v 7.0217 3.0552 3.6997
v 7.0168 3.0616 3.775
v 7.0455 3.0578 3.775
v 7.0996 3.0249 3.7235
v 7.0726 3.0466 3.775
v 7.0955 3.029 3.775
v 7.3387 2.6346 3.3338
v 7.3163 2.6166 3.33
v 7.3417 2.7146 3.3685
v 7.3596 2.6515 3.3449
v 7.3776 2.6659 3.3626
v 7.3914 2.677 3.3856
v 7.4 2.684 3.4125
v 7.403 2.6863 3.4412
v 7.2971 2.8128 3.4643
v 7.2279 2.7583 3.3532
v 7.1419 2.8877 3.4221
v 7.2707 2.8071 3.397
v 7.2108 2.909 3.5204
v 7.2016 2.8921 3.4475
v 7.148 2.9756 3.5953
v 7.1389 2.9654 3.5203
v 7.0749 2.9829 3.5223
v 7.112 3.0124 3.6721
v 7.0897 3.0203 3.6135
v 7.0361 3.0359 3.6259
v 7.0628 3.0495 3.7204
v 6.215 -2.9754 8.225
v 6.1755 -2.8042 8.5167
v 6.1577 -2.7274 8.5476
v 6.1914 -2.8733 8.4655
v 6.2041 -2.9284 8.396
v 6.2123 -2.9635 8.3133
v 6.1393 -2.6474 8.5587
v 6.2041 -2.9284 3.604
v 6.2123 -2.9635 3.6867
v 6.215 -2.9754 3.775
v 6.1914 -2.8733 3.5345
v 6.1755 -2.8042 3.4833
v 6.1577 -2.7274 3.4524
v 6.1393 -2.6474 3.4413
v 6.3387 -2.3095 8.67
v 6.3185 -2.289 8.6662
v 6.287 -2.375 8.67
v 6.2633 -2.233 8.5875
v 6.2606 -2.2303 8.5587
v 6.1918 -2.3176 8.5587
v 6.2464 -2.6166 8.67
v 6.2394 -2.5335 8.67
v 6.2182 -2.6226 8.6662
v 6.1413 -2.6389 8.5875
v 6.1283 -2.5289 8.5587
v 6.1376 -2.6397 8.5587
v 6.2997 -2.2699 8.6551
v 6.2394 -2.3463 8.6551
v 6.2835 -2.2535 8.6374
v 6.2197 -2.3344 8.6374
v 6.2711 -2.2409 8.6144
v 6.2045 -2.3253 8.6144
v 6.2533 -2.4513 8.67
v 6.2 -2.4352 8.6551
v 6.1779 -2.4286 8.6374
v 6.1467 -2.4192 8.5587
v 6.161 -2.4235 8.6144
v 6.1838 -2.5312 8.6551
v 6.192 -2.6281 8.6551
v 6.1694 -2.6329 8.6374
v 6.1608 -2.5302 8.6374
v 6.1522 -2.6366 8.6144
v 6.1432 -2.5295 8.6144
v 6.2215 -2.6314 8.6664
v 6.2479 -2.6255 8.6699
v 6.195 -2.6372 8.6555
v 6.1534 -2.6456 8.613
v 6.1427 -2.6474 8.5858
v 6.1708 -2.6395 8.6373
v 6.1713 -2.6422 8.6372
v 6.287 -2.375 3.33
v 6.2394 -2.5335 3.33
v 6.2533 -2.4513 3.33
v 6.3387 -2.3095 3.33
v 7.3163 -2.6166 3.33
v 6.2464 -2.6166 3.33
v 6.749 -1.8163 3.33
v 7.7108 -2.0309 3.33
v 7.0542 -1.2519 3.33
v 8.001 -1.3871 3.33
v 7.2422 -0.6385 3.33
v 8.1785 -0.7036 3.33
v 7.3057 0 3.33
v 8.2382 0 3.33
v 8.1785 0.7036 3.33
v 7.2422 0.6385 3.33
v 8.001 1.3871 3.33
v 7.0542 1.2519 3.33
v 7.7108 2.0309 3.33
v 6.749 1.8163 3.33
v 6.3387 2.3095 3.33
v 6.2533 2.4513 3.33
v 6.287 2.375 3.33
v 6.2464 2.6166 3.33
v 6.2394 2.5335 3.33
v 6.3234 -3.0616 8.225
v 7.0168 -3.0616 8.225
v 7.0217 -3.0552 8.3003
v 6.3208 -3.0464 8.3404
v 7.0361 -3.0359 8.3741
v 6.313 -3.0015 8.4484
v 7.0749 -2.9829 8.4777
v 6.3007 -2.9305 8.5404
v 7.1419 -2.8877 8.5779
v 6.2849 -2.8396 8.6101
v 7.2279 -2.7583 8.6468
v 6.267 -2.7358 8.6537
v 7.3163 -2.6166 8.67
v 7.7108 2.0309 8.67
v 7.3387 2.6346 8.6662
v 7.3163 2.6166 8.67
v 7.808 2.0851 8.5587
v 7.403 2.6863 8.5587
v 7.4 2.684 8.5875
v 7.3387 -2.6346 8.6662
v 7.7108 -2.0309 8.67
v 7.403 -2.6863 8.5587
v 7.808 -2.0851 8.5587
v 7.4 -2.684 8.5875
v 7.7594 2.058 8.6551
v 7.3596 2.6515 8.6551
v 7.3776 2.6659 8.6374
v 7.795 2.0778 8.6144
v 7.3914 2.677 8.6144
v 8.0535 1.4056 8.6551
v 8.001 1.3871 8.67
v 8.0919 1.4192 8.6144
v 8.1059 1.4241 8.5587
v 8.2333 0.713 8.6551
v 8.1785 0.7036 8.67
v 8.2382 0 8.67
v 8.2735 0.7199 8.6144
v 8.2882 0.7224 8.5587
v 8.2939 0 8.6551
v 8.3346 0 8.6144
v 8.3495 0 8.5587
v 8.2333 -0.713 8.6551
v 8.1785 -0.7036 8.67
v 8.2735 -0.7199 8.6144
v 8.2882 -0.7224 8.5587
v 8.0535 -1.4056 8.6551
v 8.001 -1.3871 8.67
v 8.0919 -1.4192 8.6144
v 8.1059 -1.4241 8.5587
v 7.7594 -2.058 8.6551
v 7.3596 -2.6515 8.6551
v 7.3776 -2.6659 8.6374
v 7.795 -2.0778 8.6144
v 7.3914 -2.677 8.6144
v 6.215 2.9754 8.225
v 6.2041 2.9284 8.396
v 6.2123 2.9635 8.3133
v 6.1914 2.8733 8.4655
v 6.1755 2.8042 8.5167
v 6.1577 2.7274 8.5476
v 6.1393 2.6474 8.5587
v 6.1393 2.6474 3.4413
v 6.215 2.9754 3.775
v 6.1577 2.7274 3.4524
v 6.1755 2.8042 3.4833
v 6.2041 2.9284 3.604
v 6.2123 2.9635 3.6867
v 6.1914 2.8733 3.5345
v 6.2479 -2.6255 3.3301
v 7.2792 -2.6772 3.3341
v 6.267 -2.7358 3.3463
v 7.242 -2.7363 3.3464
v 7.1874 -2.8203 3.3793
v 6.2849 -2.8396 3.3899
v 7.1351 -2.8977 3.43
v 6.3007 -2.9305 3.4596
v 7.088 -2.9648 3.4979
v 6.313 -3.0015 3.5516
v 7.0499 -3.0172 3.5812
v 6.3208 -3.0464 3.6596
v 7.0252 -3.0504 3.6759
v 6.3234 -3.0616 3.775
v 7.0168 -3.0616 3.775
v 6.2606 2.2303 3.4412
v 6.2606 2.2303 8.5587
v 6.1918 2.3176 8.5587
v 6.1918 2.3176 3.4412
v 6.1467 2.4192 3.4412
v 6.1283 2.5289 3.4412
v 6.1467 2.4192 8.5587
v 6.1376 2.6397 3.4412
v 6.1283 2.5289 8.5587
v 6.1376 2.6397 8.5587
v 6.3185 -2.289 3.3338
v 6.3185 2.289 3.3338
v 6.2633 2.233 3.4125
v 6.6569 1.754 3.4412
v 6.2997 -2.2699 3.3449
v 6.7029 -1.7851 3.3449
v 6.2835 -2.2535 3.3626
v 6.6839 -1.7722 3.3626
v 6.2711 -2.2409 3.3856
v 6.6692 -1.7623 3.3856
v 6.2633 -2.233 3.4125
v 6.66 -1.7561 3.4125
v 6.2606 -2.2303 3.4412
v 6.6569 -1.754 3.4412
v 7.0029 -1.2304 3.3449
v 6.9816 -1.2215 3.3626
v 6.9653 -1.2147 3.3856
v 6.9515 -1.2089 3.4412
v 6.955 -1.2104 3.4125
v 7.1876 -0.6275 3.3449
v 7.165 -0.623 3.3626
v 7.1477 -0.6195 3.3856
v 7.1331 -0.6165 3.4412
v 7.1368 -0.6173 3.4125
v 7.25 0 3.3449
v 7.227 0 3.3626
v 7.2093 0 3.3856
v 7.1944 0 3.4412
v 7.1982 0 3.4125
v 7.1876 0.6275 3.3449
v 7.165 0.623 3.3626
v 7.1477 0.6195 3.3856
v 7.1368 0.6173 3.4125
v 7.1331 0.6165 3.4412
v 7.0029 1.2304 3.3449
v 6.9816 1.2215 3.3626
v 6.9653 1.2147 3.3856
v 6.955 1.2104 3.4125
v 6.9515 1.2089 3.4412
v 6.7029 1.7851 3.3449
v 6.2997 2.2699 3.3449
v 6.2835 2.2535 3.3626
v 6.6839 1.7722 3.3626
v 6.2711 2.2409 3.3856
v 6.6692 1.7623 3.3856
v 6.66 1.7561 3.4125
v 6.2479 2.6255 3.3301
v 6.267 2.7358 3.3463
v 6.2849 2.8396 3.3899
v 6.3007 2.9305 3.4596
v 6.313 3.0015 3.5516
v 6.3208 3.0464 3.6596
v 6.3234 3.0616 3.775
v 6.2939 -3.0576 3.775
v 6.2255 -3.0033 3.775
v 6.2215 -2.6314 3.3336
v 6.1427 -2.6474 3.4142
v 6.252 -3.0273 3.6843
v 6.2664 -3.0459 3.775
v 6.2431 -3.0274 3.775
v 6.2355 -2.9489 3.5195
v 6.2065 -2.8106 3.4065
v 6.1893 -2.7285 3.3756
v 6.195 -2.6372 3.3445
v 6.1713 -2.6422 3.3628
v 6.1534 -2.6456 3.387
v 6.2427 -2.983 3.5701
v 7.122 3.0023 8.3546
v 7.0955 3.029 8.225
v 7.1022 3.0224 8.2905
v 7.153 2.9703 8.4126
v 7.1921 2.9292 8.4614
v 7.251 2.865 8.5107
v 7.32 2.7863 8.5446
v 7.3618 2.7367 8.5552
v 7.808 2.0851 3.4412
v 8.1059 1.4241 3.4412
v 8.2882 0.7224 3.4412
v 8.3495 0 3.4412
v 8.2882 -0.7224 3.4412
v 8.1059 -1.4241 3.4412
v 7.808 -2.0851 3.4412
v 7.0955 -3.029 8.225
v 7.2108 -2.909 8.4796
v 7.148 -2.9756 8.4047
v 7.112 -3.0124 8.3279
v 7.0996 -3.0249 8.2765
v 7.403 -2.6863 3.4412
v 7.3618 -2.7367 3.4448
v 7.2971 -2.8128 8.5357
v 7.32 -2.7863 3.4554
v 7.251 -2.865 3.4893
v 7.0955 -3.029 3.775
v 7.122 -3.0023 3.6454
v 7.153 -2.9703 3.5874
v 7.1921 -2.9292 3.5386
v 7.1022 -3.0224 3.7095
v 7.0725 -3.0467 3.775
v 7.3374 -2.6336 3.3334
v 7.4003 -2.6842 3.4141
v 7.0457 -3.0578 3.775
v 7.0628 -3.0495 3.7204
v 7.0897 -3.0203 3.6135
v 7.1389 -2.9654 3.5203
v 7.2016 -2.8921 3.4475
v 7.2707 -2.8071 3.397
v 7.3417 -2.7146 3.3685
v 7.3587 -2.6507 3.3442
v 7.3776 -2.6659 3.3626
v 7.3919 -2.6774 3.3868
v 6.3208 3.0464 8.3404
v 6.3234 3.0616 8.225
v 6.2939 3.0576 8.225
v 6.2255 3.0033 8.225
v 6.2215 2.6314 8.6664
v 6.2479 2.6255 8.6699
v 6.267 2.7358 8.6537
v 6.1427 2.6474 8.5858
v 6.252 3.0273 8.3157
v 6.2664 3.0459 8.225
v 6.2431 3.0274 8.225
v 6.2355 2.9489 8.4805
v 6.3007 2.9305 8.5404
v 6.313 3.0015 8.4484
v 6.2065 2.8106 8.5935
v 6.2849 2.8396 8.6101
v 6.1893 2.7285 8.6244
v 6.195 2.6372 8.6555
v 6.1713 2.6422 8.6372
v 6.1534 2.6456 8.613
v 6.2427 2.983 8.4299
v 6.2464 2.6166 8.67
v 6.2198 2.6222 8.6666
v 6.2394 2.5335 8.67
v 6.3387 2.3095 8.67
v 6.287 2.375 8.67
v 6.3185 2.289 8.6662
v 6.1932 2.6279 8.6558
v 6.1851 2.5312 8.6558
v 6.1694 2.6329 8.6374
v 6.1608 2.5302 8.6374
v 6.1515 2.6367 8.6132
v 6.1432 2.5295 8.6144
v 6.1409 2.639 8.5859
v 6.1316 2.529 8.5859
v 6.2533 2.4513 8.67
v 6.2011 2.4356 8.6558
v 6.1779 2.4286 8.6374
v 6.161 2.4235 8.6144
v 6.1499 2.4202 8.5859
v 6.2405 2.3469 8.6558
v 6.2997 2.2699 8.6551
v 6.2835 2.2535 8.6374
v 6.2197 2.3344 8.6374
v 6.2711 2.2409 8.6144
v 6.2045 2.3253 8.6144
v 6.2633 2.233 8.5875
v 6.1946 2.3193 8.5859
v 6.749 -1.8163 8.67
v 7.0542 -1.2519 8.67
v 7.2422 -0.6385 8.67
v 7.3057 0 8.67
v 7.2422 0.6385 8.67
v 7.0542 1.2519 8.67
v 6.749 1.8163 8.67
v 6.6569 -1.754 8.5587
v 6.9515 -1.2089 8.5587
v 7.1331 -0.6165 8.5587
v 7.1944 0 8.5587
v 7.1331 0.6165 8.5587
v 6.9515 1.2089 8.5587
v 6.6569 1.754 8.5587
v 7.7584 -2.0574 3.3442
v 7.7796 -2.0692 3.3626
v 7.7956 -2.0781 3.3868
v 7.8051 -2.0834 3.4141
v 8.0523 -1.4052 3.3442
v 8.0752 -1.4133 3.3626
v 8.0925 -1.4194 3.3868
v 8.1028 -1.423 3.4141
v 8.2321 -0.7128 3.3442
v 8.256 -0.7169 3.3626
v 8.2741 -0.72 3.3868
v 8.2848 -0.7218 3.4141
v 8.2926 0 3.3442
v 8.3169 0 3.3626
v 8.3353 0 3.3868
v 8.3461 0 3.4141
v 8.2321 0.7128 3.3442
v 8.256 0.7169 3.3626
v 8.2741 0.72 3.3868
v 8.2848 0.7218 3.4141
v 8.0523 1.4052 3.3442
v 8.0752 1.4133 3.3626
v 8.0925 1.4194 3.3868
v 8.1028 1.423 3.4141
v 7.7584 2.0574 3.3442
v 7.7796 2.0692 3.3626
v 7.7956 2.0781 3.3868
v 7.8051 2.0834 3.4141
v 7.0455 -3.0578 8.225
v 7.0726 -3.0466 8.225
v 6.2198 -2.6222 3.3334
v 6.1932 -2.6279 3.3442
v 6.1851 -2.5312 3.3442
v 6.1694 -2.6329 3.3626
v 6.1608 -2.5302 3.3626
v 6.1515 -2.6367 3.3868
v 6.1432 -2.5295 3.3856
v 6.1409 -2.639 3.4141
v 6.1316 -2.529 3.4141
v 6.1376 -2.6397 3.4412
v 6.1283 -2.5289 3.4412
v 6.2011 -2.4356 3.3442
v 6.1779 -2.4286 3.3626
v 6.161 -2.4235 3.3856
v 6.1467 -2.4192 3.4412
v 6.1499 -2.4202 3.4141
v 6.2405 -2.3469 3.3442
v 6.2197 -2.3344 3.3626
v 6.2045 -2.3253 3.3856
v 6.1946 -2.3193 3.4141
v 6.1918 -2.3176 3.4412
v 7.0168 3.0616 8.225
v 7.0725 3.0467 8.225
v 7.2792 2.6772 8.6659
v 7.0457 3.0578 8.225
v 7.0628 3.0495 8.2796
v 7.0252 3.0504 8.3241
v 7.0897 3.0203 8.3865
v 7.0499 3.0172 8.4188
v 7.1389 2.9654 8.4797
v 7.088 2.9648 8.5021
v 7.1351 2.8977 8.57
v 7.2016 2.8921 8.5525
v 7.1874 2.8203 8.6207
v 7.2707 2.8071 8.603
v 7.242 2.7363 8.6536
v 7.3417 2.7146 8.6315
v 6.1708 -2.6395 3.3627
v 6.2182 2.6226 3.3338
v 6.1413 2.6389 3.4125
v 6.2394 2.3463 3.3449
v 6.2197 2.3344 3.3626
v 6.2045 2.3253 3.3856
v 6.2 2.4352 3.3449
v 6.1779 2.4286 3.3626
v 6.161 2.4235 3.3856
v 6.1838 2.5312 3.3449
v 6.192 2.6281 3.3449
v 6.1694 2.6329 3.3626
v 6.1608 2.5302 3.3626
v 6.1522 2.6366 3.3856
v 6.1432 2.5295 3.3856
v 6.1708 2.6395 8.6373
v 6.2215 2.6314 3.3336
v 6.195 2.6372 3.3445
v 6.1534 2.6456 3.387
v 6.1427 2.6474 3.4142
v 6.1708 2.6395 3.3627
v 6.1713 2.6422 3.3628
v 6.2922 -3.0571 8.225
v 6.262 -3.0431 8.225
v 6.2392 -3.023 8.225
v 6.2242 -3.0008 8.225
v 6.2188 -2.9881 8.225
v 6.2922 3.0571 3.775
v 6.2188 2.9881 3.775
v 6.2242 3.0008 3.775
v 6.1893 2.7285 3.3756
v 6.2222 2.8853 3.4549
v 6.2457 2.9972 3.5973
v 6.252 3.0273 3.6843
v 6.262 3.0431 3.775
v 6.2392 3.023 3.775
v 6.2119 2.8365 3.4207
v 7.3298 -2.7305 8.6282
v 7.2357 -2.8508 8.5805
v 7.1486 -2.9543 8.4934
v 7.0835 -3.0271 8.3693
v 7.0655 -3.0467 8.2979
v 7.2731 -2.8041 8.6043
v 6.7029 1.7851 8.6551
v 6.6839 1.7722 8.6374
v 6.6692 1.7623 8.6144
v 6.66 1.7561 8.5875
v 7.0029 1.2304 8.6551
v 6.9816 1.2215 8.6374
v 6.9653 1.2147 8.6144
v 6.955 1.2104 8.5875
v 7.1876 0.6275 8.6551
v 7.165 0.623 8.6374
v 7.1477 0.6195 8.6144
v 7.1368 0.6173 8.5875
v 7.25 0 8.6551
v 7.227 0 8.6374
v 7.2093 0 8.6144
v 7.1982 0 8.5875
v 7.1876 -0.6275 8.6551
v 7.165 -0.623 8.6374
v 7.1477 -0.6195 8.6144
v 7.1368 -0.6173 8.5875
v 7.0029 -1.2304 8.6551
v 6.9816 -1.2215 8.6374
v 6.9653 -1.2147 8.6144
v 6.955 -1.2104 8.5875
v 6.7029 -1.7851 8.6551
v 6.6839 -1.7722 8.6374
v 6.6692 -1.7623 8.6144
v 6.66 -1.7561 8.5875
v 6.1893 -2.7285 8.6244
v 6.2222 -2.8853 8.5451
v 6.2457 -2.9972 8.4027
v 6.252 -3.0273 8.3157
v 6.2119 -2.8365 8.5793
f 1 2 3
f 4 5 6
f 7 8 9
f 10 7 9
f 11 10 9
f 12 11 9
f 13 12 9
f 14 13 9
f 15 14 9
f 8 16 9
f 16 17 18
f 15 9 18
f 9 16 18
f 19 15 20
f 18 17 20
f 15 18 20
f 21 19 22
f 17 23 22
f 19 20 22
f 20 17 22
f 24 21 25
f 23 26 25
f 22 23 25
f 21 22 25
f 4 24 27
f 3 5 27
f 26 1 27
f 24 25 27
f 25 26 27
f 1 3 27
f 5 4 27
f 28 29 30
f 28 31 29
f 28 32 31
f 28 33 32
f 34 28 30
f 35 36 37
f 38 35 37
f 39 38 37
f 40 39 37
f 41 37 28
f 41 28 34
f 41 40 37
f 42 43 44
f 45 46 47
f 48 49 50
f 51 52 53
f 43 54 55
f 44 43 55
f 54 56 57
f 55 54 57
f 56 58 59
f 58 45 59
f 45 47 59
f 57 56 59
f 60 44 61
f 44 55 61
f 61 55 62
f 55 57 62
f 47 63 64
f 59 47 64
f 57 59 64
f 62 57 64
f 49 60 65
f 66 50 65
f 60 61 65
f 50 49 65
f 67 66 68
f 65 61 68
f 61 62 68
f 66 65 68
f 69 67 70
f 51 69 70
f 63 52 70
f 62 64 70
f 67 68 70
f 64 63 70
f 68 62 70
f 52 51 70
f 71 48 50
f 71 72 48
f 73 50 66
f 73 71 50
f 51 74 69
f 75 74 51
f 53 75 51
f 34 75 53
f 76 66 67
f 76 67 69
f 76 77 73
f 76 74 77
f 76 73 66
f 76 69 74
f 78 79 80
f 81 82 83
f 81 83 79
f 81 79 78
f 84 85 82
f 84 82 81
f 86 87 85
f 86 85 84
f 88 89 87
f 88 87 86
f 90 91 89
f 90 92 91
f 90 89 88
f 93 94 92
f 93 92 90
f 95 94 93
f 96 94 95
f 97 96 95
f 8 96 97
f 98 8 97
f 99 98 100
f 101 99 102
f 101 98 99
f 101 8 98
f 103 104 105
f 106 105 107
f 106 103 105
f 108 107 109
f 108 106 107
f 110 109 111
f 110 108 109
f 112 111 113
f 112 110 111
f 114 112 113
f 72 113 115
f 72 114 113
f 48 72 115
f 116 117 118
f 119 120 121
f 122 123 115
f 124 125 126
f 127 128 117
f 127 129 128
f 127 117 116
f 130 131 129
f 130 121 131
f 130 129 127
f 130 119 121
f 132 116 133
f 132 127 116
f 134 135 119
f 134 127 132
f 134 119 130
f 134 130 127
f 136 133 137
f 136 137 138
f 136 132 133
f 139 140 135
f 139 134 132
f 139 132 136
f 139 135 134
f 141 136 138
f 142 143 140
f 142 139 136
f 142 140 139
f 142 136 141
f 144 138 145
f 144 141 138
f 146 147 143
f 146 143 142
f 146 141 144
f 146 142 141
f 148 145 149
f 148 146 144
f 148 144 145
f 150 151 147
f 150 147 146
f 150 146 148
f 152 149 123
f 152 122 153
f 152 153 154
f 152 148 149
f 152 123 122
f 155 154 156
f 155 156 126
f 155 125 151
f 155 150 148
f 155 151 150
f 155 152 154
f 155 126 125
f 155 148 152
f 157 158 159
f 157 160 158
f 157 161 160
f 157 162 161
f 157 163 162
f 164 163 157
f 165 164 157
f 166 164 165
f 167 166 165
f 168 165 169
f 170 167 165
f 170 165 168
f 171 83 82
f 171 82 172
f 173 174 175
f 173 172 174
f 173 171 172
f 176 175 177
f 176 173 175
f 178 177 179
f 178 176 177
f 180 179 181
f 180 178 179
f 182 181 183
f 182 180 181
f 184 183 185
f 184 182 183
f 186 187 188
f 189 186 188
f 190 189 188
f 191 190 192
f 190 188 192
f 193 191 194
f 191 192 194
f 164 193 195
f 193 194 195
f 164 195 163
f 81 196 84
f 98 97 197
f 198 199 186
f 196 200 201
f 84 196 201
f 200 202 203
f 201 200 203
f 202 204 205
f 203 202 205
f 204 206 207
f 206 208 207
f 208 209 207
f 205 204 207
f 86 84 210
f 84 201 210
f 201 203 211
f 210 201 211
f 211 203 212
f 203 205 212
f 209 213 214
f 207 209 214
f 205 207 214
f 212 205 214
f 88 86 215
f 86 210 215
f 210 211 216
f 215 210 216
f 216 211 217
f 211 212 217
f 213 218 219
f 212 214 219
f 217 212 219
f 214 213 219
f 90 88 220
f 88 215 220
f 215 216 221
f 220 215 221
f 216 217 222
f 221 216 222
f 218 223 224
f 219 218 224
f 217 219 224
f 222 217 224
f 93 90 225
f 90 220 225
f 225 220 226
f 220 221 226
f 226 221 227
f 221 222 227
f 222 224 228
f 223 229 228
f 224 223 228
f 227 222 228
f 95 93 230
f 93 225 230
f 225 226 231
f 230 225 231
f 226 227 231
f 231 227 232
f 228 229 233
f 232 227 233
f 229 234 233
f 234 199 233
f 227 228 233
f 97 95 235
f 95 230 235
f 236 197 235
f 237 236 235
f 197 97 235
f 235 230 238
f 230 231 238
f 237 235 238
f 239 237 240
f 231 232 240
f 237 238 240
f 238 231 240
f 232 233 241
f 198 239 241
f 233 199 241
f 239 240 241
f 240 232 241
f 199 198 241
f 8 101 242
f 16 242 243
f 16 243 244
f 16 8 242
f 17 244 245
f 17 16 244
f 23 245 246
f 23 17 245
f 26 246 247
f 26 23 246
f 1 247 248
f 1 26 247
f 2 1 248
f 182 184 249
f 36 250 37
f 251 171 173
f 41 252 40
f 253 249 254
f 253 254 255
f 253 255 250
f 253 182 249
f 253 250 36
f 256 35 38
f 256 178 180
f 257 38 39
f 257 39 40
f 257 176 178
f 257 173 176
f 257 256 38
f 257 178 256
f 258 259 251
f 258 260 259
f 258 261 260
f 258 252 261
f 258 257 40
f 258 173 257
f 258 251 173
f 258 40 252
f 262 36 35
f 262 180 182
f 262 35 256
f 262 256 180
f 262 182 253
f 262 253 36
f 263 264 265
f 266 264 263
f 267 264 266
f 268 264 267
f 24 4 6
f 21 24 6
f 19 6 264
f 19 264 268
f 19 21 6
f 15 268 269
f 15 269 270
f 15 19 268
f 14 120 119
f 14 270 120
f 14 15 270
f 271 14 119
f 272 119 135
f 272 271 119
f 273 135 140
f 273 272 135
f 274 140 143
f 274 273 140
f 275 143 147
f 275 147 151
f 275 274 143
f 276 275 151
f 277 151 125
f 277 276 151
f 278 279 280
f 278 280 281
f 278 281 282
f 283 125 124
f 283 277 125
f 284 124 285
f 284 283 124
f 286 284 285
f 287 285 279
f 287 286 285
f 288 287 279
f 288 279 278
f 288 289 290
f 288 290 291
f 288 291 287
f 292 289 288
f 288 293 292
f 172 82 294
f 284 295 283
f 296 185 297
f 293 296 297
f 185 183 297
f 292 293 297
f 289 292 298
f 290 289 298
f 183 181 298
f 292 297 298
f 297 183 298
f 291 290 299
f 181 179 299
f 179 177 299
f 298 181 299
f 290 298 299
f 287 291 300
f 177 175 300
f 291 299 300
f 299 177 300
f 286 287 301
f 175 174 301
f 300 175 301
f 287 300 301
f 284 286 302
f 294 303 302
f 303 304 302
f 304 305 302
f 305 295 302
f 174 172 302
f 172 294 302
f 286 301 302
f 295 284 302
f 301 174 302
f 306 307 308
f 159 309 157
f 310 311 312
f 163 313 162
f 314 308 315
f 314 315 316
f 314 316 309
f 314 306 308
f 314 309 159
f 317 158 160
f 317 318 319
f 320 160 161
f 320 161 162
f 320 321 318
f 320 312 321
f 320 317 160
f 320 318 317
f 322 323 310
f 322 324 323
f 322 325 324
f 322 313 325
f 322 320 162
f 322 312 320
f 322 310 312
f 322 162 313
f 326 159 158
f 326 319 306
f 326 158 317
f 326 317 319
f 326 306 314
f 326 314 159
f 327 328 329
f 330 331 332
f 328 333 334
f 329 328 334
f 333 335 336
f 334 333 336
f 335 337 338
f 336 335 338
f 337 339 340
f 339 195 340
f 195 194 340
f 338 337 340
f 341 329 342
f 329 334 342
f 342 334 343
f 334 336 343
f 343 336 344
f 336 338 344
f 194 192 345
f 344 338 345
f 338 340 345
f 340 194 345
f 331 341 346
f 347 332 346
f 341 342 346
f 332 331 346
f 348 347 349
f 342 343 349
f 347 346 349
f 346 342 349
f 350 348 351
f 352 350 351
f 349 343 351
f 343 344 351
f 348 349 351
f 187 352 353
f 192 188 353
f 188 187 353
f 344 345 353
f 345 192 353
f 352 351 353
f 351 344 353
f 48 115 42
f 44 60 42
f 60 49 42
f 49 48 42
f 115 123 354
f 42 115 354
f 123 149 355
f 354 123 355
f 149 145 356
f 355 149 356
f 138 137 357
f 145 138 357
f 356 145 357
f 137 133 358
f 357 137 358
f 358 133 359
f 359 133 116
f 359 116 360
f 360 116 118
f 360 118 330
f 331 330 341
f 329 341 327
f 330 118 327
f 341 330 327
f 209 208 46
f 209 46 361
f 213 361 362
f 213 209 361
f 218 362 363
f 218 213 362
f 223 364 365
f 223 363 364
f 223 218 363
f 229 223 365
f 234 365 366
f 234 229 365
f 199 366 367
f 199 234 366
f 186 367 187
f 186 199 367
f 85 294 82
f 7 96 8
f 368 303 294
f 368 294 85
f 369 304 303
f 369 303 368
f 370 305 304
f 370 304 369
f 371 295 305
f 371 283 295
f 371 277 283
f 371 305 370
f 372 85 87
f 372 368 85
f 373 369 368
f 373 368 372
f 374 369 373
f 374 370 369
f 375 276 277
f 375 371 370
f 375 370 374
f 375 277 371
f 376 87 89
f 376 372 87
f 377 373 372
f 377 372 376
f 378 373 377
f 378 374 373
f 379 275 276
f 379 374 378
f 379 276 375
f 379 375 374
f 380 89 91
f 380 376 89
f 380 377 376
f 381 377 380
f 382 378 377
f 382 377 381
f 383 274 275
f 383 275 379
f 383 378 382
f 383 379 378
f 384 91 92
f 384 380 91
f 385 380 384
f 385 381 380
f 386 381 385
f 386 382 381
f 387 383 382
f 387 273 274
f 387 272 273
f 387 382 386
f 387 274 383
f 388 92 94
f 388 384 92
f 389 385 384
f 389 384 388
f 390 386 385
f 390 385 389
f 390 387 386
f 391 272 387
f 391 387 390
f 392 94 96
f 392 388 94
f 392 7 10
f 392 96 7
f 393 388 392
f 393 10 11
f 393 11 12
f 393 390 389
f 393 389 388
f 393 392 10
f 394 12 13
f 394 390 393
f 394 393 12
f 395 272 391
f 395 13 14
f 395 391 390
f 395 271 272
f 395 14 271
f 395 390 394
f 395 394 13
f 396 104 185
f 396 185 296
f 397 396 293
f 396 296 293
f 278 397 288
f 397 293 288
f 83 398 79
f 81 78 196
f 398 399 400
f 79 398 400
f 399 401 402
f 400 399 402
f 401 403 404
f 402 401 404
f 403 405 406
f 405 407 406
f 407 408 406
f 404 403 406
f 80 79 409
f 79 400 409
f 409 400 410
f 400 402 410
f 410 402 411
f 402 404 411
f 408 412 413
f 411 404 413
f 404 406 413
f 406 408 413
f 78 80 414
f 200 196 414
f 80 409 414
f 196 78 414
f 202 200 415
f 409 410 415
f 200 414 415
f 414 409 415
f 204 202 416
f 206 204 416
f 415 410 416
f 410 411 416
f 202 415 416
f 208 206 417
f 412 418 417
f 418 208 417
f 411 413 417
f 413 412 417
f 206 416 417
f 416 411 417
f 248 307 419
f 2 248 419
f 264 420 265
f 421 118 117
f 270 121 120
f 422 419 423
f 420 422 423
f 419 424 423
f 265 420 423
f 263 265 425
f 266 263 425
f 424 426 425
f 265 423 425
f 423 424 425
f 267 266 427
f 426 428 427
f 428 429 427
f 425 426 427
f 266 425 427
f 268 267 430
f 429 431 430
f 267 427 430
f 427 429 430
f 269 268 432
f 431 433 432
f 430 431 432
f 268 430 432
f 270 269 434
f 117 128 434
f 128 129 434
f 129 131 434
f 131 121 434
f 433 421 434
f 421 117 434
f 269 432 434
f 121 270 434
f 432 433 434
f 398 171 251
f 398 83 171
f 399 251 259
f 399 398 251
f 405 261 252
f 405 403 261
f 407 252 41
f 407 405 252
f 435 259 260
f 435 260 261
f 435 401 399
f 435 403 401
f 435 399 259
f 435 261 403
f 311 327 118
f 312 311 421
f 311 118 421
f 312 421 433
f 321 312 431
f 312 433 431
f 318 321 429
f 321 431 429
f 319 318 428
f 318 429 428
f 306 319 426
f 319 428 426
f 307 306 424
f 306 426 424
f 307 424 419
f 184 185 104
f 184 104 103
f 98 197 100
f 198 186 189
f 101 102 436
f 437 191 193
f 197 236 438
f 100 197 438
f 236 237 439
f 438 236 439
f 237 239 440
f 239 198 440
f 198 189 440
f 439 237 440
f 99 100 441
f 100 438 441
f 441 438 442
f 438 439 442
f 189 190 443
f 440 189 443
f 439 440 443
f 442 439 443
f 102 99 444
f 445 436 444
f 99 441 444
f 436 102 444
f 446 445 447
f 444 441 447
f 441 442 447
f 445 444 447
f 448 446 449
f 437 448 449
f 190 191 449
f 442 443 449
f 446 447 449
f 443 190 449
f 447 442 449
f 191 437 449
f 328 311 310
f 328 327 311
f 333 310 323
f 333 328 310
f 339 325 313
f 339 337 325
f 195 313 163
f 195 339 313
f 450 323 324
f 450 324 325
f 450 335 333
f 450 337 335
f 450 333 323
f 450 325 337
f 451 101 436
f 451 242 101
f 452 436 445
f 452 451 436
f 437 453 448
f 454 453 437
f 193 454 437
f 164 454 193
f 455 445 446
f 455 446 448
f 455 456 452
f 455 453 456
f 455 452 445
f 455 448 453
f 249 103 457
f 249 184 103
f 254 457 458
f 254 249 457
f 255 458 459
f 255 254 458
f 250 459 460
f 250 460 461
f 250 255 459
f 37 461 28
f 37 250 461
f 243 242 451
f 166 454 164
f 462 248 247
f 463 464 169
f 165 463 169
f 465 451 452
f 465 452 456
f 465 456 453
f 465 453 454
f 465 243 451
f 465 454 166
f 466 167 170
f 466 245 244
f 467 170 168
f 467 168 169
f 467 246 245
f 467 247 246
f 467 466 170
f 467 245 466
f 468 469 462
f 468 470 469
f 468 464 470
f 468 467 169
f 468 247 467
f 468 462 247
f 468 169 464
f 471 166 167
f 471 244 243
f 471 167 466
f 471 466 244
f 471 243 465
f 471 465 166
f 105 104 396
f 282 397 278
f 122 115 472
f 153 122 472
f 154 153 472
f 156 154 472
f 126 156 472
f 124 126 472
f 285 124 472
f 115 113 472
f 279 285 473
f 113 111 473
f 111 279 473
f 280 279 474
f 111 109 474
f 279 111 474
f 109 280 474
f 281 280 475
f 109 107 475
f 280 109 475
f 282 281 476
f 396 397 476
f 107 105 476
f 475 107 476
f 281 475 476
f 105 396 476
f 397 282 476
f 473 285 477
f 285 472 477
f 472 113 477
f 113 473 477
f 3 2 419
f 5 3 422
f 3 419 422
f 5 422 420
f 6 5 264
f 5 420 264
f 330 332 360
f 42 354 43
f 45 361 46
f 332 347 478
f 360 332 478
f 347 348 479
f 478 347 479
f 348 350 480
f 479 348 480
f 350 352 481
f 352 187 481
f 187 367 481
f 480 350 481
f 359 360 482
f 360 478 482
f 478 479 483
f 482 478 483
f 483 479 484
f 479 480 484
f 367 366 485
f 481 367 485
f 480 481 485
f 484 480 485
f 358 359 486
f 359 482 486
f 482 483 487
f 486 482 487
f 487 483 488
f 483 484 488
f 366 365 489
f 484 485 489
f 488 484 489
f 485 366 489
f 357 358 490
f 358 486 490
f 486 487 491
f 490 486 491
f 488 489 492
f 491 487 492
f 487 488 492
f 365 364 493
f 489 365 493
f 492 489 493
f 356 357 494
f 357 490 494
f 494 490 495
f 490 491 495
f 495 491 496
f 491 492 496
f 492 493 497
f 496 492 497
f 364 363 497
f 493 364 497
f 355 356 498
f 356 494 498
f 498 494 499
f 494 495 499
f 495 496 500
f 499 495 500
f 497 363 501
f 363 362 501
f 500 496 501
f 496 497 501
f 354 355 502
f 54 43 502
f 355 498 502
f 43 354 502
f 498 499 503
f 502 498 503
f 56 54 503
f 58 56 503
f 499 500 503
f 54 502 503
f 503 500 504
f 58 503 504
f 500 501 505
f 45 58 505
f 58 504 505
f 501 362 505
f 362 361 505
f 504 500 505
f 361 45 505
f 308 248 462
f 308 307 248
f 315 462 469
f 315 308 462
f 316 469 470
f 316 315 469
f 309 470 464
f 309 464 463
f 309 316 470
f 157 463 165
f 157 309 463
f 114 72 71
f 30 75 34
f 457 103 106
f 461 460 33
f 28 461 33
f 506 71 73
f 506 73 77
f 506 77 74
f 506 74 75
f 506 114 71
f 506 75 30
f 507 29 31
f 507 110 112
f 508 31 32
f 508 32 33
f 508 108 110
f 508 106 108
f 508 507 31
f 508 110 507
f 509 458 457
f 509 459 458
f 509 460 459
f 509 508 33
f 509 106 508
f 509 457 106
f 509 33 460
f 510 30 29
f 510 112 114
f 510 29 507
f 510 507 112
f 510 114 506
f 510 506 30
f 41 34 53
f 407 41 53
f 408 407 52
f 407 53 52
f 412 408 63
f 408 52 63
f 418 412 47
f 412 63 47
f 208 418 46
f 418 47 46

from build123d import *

# Parameters (mm, degrees)
BOSS_EXTRUDE1_DEPTH = 12
FILLET1_R           = 1
FILLET2_R           = 1
FILLET3_R           = 0.25
SCALE1_SCALE        = 0.445


with BuildPart() as part:
    # Sketch1 → Boss-Extrude1 (new body)
    with BuildSketch(Plane.XY):
        with BuildLine():
            Line((6.738137725, -6.88), (4.878137725, -6.88))
            Line((4.878137725, -6.88), (4.531835438, -5.38))
            ThreePointArc((4.531835438, -5.38), (7.034339517, 0), (4.531835438, 5.38))
            Line((4.531835438, 5.38), (4.878137725, 6.88))
            Line((4.878137725, 6.88), (6.738137725, 6.88))
            ThreePointArc((6.738137725, 6.88), (9.63, 0), (6.738137725, -6.88))
        make_face()
    extrude(amount=BOSS_EXTRUDE1_DEPTH)

    # Fillet1
    fillet1_edges = [part.edges().sort_by_distance(p)[0] for p in [
        (4.531835438, -5.38, 6),
        (4.531835438, 5.38, 6),
    ]]
    fillet(fillet1_edges, radius=FILLET1_R)

    # Fillet2
    fillet2_edges = [part.edges().sort_by_distance(p)[0] for p in [
        (5.808137725, -6.88, 12),
        (5.808137725, -6.88, 0),
        (5.808137725, 6.88, 12),
        (5.808137725, 6.88, 0),
    ]]
    fillet(fillet2_edges, radius=FILLET2_R)

    # Fillet3
    fillet3_edges = [part.edges().sort_by_distance(p)[0] for p in [
        (7.034339517, 0, 0),
        (4.687877266, 5.411310183, 0),
        (7.034339517, 0, 12),
        (4.687877266, -5.411310183, 12),
        (9.63, 0, 12),
        (4.687877266, 5.411310183, 12),
        (9.63, 0, 0),
        (6.738137725, 6.88, 6),
        (6.738137725, -6.88, 6),
        (7.064336577, 6.544619807, 0.2528183),
        (7.064336577, 6.544619807, 11.7471817),
        (7.064336577, -6.544619807, 0.2528183),
        (7.064336589, -6.544619821, 11.747181705),
        (4.878137725, -6.88, 6),
        (4.815123489, -6.607055355, 0.313421155),
        (4.815123489, -6.607055355, 11.686578845),
        (4.687877266, -5.411310183, 0),
        (4.655934772, -5.914769545, 0.000604643),
        (4.655934772, -5.914769545, 11.999395357),
        (4.655934776, 5.914769544, 0.00060465),
        (4.655934776, 5.914769544, 11.99939535),
        (4.878137725, 6.88, 6),
        (4.815123489, 6.607055355, 0.313421155),
        (4.815123489, 6.607055355, 11.686578845),
    ]]
    fillet(fillet3_edges, radius=FILLET3_R)


with BuildPart() as part_1:
    # Scale1: scaled about (7.322759703, 3.2e-08, 5.999999972)
    add(part.part.scale(SCALE1_SCALE).moved(Location((4.064131635, 1.8e-08, 3.329999984))))


solid = part_1.part
